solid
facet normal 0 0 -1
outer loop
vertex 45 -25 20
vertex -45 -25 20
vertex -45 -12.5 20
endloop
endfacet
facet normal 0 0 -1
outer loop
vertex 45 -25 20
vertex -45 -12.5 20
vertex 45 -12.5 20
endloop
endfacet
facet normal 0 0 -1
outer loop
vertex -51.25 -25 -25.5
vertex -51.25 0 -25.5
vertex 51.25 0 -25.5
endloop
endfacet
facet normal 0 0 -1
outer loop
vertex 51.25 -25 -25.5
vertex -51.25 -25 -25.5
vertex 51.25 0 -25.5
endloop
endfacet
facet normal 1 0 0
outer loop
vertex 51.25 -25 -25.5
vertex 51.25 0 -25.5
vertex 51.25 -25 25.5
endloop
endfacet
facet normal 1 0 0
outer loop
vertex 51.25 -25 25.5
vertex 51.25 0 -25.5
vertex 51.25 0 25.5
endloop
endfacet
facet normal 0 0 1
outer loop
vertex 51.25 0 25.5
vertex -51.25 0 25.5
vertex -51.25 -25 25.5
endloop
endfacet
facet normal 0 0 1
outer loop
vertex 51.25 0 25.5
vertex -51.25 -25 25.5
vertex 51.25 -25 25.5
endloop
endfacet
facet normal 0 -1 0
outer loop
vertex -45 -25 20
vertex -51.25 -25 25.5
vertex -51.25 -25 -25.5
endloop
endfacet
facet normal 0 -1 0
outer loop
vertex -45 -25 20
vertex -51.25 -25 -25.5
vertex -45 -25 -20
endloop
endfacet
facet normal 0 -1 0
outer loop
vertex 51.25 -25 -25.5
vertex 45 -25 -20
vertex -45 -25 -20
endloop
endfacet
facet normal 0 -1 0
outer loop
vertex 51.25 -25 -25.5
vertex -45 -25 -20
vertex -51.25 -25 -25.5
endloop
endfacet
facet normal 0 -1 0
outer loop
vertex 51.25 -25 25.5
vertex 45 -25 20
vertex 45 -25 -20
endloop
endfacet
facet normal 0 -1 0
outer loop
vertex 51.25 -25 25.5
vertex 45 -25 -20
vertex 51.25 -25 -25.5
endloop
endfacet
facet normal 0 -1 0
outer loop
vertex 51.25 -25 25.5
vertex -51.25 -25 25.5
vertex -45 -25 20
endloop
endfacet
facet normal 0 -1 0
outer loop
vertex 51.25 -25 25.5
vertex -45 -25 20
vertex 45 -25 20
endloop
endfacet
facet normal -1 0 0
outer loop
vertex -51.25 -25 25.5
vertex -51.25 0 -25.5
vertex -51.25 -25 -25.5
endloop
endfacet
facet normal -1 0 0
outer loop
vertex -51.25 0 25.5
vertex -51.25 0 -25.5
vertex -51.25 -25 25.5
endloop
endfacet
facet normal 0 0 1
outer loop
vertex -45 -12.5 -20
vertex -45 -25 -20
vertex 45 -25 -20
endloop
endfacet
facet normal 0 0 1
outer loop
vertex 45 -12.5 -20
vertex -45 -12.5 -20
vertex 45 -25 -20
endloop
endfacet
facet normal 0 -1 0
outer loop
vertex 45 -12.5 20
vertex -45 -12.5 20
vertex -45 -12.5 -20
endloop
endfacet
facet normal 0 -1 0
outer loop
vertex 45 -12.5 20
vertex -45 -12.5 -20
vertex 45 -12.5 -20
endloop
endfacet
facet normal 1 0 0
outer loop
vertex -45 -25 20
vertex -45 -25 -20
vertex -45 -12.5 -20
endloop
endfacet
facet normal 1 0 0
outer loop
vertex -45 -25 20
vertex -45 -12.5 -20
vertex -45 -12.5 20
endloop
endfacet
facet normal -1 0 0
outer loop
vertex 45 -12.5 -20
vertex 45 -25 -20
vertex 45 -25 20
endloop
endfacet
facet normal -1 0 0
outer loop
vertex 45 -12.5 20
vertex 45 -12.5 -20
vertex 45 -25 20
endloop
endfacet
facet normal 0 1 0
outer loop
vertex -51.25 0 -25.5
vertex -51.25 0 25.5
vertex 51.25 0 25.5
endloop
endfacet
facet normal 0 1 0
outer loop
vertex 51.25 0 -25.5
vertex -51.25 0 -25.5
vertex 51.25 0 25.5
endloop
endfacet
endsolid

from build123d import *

# Parameters (mm, degrees)
F0_W     = 102.5
F0_H     = 51
F1_DEPTH = 25
F2_W     = 90
F2_H     = 40
F3_DEPTH = 12.5


# Not quite as in the source:
# - the program builds the solid bodies; features that only make, move or delete a surface that nothing else refers to are left out


with BuildPart() as f1:
    # F0 (on Front) → F1 (new body)
    with BuildSketch(Plane.XZ):
        Rectangle(F0_W, F0_H)
    extrude(amount=F1_DEPTH)

    # F2 (on face) → F3 (cut, symmetric)
    with BuildSketch(Plane.XZ.offset(25)):
        Rectangle(F2_W, F2_H)
    extrude(amount=F3_DEPTH, both=True, mode=Mode.SUBTRACT)


solid = f1.part
